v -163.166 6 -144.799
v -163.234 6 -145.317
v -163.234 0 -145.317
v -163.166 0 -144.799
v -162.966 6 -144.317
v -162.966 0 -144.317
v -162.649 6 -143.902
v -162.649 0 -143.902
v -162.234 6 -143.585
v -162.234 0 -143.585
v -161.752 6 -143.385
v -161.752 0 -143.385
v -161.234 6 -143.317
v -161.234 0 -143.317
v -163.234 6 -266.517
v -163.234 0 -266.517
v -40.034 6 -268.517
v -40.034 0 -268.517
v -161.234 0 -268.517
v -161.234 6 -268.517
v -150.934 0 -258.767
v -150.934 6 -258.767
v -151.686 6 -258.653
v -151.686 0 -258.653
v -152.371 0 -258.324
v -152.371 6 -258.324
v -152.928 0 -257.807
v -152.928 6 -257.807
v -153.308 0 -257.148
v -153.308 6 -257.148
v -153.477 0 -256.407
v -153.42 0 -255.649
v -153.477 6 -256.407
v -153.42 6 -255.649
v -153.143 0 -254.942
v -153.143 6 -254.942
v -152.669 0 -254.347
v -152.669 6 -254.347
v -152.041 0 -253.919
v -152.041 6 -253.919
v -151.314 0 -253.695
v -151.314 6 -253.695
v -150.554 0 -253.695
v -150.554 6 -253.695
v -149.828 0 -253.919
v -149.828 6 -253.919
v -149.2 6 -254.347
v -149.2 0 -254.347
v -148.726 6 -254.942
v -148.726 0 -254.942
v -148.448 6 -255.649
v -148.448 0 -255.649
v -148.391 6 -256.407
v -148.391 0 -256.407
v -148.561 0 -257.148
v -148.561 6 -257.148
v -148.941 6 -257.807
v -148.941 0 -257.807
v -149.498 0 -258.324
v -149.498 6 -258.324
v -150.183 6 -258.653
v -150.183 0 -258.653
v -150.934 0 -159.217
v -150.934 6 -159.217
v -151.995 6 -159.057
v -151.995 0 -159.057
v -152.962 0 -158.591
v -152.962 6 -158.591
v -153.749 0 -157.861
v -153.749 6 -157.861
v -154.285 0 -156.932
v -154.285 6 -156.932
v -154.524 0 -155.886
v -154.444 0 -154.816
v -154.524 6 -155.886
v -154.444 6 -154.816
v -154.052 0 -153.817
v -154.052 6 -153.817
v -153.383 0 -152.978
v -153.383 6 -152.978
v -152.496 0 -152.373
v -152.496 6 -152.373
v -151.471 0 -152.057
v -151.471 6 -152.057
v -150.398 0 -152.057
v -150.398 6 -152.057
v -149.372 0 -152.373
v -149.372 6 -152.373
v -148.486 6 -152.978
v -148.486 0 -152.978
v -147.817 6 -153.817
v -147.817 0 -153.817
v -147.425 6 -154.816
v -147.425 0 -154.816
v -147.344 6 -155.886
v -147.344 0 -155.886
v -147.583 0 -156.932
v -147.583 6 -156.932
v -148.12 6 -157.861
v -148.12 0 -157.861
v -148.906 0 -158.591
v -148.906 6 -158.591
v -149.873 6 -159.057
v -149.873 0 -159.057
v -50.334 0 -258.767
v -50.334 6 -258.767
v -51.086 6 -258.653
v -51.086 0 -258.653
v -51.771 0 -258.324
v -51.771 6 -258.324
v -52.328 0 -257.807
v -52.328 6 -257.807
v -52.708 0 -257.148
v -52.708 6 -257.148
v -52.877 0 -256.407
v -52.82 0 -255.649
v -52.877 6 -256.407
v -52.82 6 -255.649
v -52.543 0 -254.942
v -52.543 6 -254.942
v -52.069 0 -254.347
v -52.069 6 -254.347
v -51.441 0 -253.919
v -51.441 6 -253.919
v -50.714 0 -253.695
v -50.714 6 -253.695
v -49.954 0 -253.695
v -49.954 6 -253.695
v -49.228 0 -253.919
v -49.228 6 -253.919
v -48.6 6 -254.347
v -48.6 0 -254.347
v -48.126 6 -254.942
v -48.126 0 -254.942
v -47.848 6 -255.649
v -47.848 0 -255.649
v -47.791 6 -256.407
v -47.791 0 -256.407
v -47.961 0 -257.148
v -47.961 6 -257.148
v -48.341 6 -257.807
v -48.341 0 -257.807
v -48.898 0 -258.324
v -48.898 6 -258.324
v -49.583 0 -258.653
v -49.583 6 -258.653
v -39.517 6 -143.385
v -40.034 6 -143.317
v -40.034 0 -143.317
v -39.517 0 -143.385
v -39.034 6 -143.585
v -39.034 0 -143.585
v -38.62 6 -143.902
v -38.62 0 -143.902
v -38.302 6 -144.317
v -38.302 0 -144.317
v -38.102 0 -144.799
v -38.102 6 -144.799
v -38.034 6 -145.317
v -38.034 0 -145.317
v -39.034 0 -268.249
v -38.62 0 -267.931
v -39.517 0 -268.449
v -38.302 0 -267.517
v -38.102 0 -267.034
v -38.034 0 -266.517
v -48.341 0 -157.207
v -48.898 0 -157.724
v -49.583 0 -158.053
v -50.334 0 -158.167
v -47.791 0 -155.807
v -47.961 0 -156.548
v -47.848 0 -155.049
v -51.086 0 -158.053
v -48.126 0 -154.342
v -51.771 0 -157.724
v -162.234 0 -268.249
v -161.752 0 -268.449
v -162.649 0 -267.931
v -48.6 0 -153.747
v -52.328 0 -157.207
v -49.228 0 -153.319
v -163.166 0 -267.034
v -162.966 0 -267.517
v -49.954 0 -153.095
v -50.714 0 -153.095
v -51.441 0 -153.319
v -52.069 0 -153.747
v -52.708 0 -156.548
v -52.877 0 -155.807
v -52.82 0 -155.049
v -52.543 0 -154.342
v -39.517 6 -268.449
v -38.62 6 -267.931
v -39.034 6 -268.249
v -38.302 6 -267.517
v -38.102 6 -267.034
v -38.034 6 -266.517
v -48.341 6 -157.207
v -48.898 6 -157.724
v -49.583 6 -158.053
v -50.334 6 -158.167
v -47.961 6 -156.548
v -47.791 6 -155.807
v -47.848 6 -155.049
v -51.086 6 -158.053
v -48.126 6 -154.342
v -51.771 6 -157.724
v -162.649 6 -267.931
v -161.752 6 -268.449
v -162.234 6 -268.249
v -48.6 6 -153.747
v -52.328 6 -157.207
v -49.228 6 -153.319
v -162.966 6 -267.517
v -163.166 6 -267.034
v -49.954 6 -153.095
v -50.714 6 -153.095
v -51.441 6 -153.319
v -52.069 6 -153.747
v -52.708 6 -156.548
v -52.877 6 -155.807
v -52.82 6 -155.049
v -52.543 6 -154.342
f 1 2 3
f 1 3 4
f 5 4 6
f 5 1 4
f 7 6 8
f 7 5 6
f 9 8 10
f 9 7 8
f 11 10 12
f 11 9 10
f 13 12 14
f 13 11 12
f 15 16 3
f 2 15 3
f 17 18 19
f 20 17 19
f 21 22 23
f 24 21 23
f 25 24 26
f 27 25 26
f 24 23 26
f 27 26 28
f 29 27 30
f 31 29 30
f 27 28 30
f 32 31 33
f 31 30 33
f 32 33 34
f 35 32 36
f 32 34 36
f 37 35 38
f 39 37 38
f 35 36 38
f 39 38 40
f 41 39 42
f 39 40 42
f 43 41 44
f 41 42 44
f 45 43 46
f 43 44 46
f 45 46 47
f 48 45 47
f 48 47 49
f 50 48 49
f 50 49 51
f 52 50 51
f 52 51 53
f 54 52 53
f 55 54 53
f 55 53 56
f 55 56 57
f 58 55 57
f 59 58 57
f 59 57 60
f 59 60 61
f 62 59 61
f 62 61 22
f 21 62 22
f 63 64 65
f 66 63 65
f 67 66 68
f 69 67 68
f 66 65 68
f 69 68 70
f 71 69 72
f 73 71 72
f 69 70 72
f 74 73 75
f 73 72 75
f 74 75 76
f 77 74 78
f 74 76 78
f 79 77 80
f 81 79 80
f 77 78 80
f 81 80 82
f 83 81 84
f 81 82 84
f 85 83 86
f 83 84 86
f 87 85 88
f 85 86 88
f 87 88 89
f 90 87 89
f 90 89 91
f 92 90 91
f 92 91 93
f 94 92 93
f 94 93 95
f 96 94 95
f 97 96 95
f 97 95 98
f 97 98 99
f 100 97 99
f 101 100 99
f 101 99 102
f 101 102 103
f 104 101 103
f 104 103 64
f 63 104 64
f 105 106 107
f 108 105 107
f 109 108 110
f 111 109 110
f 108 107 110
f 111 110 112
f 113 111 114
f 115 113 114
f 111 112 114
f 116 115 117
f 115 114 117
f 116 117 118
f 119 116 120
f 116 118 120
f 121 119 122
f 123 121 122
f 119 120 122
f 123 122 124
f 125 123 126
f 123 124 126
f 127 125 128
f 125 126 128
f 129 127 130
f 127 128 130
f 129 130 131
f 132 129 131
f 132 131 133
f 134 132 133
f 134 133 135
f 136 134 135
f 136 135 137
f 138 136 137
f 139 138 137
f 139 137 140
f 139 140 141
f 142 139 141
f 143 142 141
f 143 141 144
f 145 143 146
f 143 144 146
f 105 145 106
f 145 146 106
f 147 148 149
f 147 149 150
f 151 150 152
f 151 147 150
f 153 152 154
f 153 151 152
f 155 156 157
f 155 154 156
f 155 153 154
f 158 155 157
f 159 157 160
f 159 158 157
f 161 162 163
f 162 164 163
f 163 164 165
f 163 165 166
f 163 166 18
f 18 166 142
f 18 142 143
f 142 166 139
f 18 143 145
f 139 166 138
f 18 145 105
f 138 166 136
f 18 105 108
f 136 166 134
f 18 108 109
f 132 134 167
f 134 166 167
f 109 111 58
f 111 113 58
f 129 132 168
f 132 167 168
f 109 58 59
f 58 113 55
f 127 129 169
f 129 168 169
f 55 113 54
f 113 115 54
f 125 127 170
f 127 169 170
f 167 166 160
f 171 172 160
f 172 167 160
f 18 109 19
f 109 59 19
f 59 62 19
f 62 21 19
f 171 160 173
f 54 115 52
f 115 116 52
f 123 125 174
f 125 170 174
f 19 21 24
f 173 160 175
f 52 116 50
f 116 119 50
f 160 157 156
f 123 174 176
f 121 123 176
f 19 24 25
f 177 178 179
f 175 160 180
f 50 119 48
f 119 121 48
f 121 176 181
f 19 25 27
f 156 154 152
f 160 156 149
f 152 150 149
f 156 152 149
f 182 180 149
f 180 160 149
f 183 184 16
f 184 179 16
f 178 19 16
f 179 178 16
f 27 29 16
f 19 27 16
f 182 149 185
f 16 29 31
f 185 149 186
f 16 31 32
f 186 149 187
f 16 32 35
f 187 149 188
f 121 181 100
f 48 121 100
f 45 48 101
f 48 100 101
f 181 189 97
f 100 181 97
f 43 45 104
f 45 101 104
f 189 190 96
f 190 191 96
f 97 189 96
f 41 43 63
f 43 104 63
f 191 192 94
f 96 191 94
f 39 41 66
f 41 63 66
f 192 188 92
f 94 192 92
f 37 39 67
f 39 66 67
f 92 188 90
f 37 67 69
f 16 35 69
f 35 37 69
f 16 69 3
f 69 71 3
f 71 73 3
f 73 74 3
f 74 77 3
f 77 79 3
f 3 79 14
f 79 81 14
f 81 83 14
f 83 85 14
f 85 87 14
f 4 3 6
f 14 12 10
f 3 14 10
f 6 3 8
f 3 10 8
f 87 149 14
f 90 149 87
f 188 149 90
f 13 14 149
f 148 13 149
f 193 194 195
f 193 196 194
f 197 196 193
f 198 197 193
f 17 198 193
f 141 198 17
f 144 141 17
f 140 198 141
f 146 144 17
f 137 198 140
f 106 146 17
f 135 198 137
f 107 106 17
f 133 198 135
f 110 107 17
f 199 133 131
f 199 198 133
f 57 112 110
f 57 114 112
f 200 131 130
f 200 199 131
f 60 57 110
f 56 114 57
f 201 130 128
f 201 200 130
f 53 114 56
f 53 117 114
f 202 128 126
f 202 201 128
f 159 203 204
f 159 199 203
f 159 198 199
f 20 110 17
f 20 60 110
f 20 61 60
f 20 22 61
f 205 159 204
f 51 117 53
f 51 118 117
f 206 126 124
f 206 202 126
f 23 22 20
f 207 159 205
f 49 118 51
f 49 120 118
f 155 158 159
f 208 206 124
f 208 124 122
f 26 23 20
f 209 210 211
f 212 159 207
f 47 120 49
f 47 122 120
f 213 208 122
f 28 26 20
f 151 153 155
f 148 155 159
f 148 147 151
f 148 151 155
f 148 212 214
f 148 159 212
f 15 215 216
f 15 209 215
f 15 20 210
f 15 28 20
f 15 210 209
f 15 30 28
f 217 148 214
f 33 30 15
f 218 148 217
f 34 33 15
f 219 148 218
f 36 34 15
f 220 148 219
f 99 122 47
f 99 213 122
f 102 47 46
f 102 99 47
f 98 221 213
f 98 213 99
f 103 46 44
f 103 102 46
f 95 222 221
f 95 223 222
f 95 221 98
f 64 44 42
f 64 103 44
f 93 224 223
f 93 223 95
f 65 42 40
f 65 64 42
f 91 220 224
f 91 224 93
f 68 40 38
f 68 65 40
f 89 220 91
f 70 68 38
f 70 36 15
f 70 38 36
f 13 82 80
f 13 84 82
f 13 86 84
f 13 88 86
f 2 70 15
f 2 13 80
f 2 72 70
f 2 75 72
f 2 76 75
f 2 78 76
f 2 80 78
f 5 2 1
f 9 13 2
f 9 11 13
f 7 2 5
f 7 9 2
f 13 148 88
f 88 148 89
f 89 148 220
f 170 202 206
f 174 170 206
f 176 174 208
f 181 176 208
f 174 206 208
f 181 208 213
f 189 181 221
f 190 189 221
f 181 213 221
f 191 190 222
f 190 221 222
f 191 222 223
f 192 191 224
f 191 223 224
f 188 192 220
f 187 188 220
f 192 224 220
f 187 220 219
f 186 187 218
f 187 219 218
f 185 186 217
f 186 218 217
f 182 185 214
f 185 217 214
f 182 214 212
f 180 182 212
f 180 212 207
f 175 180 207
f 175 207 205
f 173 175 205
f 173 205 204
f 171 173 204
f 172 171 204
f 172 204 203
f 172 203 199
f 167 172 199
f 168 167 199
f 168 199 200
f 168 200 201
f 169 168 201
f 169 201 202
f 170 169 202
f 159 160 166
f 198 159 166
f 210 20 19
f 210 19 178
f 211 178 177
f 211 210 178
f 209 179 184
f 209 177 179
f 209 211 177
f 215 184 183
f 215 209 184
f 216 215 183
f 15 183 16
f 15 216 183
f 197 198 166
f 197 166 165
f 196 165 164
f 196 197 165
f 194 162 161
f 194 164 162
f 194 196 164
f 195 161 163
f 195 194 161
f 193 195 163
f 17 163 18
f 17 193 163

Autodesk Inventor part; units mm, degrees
ref_plane "YZ Plane" through (0, 0, 0) normal (1, 0, 0) x (0, 1, 0)
ref_plane "XZ Plane" through (0, 0, 0) normal (0, 1, 0) x (-1, 0, 0)
ref_plane "XY Plane" through (0, 0, 0) normal (0, 0, 1) x (1, 0, 0)
sketch "Sketch1" plane through (0, 0, 0) normal (0, 1, 0) x (-1, 0, 0)
  line L0 (163.2343, -143.3167) -> (38.0343, -143.3167)
  line L1 (38.0343, -143.3167) -> (38.0343, -268.5167)
  line L2 (38.0343, -268.5167) -> (163.2343, -268.5167)
  line L3 (163.2343, -268.5167) -> (163.2343, -143.3167)
  line L4 (150.9343, -143.3167) -> (150.9343, -268.5167) construction
  line L5 (50.3343, -143.3167) -> (50.3343, -268.5167) construction
  line L6 (172.4431, -155.6167) -> (11.5351, -155.6167) construction
  line L7 (172.4431, -256.2167) -> (14.5022, -256.2167) construction
  point P0 (0, 0)
  point P1 (150.9343, -155.6167)
  point P2 (150.9343, -256.2167)
  point P3 (50.3343, -155.6167)
  point P4 (50.3343, -256.2167)
  dimension "d0" = 125.2
  dimension "d1" = 125.2
  dimension "d16" = 12.3
  dimension "d17" = 100.6
  dimension "d18" = 100.6
extrude "Extrusion1" add sketch "Sketch1" along normal blind 6
fillet "Fillet1" radius 2 4 edges at (-163.2343, 3, -268.5167) (-163.2343, 3, -143.3167) (-38.0343, 3, -143.3167) (-38.0343, 3, -268.5167)
hole "Hole1" at (-150.9343, 0, -256.2167) at (-50.3343, 0, -256.2167) at (-50.3343, 0, -155.6167) direction (0, 1, 0) diameter 5.1 end through all
hole "Hole2" at (-150.9343, 0, -155.6167) direction (0, 1, 0) diameter 7.2 end through all
properties part number "C beam gantry (small side y axis)" material "Aluminum 6061"
